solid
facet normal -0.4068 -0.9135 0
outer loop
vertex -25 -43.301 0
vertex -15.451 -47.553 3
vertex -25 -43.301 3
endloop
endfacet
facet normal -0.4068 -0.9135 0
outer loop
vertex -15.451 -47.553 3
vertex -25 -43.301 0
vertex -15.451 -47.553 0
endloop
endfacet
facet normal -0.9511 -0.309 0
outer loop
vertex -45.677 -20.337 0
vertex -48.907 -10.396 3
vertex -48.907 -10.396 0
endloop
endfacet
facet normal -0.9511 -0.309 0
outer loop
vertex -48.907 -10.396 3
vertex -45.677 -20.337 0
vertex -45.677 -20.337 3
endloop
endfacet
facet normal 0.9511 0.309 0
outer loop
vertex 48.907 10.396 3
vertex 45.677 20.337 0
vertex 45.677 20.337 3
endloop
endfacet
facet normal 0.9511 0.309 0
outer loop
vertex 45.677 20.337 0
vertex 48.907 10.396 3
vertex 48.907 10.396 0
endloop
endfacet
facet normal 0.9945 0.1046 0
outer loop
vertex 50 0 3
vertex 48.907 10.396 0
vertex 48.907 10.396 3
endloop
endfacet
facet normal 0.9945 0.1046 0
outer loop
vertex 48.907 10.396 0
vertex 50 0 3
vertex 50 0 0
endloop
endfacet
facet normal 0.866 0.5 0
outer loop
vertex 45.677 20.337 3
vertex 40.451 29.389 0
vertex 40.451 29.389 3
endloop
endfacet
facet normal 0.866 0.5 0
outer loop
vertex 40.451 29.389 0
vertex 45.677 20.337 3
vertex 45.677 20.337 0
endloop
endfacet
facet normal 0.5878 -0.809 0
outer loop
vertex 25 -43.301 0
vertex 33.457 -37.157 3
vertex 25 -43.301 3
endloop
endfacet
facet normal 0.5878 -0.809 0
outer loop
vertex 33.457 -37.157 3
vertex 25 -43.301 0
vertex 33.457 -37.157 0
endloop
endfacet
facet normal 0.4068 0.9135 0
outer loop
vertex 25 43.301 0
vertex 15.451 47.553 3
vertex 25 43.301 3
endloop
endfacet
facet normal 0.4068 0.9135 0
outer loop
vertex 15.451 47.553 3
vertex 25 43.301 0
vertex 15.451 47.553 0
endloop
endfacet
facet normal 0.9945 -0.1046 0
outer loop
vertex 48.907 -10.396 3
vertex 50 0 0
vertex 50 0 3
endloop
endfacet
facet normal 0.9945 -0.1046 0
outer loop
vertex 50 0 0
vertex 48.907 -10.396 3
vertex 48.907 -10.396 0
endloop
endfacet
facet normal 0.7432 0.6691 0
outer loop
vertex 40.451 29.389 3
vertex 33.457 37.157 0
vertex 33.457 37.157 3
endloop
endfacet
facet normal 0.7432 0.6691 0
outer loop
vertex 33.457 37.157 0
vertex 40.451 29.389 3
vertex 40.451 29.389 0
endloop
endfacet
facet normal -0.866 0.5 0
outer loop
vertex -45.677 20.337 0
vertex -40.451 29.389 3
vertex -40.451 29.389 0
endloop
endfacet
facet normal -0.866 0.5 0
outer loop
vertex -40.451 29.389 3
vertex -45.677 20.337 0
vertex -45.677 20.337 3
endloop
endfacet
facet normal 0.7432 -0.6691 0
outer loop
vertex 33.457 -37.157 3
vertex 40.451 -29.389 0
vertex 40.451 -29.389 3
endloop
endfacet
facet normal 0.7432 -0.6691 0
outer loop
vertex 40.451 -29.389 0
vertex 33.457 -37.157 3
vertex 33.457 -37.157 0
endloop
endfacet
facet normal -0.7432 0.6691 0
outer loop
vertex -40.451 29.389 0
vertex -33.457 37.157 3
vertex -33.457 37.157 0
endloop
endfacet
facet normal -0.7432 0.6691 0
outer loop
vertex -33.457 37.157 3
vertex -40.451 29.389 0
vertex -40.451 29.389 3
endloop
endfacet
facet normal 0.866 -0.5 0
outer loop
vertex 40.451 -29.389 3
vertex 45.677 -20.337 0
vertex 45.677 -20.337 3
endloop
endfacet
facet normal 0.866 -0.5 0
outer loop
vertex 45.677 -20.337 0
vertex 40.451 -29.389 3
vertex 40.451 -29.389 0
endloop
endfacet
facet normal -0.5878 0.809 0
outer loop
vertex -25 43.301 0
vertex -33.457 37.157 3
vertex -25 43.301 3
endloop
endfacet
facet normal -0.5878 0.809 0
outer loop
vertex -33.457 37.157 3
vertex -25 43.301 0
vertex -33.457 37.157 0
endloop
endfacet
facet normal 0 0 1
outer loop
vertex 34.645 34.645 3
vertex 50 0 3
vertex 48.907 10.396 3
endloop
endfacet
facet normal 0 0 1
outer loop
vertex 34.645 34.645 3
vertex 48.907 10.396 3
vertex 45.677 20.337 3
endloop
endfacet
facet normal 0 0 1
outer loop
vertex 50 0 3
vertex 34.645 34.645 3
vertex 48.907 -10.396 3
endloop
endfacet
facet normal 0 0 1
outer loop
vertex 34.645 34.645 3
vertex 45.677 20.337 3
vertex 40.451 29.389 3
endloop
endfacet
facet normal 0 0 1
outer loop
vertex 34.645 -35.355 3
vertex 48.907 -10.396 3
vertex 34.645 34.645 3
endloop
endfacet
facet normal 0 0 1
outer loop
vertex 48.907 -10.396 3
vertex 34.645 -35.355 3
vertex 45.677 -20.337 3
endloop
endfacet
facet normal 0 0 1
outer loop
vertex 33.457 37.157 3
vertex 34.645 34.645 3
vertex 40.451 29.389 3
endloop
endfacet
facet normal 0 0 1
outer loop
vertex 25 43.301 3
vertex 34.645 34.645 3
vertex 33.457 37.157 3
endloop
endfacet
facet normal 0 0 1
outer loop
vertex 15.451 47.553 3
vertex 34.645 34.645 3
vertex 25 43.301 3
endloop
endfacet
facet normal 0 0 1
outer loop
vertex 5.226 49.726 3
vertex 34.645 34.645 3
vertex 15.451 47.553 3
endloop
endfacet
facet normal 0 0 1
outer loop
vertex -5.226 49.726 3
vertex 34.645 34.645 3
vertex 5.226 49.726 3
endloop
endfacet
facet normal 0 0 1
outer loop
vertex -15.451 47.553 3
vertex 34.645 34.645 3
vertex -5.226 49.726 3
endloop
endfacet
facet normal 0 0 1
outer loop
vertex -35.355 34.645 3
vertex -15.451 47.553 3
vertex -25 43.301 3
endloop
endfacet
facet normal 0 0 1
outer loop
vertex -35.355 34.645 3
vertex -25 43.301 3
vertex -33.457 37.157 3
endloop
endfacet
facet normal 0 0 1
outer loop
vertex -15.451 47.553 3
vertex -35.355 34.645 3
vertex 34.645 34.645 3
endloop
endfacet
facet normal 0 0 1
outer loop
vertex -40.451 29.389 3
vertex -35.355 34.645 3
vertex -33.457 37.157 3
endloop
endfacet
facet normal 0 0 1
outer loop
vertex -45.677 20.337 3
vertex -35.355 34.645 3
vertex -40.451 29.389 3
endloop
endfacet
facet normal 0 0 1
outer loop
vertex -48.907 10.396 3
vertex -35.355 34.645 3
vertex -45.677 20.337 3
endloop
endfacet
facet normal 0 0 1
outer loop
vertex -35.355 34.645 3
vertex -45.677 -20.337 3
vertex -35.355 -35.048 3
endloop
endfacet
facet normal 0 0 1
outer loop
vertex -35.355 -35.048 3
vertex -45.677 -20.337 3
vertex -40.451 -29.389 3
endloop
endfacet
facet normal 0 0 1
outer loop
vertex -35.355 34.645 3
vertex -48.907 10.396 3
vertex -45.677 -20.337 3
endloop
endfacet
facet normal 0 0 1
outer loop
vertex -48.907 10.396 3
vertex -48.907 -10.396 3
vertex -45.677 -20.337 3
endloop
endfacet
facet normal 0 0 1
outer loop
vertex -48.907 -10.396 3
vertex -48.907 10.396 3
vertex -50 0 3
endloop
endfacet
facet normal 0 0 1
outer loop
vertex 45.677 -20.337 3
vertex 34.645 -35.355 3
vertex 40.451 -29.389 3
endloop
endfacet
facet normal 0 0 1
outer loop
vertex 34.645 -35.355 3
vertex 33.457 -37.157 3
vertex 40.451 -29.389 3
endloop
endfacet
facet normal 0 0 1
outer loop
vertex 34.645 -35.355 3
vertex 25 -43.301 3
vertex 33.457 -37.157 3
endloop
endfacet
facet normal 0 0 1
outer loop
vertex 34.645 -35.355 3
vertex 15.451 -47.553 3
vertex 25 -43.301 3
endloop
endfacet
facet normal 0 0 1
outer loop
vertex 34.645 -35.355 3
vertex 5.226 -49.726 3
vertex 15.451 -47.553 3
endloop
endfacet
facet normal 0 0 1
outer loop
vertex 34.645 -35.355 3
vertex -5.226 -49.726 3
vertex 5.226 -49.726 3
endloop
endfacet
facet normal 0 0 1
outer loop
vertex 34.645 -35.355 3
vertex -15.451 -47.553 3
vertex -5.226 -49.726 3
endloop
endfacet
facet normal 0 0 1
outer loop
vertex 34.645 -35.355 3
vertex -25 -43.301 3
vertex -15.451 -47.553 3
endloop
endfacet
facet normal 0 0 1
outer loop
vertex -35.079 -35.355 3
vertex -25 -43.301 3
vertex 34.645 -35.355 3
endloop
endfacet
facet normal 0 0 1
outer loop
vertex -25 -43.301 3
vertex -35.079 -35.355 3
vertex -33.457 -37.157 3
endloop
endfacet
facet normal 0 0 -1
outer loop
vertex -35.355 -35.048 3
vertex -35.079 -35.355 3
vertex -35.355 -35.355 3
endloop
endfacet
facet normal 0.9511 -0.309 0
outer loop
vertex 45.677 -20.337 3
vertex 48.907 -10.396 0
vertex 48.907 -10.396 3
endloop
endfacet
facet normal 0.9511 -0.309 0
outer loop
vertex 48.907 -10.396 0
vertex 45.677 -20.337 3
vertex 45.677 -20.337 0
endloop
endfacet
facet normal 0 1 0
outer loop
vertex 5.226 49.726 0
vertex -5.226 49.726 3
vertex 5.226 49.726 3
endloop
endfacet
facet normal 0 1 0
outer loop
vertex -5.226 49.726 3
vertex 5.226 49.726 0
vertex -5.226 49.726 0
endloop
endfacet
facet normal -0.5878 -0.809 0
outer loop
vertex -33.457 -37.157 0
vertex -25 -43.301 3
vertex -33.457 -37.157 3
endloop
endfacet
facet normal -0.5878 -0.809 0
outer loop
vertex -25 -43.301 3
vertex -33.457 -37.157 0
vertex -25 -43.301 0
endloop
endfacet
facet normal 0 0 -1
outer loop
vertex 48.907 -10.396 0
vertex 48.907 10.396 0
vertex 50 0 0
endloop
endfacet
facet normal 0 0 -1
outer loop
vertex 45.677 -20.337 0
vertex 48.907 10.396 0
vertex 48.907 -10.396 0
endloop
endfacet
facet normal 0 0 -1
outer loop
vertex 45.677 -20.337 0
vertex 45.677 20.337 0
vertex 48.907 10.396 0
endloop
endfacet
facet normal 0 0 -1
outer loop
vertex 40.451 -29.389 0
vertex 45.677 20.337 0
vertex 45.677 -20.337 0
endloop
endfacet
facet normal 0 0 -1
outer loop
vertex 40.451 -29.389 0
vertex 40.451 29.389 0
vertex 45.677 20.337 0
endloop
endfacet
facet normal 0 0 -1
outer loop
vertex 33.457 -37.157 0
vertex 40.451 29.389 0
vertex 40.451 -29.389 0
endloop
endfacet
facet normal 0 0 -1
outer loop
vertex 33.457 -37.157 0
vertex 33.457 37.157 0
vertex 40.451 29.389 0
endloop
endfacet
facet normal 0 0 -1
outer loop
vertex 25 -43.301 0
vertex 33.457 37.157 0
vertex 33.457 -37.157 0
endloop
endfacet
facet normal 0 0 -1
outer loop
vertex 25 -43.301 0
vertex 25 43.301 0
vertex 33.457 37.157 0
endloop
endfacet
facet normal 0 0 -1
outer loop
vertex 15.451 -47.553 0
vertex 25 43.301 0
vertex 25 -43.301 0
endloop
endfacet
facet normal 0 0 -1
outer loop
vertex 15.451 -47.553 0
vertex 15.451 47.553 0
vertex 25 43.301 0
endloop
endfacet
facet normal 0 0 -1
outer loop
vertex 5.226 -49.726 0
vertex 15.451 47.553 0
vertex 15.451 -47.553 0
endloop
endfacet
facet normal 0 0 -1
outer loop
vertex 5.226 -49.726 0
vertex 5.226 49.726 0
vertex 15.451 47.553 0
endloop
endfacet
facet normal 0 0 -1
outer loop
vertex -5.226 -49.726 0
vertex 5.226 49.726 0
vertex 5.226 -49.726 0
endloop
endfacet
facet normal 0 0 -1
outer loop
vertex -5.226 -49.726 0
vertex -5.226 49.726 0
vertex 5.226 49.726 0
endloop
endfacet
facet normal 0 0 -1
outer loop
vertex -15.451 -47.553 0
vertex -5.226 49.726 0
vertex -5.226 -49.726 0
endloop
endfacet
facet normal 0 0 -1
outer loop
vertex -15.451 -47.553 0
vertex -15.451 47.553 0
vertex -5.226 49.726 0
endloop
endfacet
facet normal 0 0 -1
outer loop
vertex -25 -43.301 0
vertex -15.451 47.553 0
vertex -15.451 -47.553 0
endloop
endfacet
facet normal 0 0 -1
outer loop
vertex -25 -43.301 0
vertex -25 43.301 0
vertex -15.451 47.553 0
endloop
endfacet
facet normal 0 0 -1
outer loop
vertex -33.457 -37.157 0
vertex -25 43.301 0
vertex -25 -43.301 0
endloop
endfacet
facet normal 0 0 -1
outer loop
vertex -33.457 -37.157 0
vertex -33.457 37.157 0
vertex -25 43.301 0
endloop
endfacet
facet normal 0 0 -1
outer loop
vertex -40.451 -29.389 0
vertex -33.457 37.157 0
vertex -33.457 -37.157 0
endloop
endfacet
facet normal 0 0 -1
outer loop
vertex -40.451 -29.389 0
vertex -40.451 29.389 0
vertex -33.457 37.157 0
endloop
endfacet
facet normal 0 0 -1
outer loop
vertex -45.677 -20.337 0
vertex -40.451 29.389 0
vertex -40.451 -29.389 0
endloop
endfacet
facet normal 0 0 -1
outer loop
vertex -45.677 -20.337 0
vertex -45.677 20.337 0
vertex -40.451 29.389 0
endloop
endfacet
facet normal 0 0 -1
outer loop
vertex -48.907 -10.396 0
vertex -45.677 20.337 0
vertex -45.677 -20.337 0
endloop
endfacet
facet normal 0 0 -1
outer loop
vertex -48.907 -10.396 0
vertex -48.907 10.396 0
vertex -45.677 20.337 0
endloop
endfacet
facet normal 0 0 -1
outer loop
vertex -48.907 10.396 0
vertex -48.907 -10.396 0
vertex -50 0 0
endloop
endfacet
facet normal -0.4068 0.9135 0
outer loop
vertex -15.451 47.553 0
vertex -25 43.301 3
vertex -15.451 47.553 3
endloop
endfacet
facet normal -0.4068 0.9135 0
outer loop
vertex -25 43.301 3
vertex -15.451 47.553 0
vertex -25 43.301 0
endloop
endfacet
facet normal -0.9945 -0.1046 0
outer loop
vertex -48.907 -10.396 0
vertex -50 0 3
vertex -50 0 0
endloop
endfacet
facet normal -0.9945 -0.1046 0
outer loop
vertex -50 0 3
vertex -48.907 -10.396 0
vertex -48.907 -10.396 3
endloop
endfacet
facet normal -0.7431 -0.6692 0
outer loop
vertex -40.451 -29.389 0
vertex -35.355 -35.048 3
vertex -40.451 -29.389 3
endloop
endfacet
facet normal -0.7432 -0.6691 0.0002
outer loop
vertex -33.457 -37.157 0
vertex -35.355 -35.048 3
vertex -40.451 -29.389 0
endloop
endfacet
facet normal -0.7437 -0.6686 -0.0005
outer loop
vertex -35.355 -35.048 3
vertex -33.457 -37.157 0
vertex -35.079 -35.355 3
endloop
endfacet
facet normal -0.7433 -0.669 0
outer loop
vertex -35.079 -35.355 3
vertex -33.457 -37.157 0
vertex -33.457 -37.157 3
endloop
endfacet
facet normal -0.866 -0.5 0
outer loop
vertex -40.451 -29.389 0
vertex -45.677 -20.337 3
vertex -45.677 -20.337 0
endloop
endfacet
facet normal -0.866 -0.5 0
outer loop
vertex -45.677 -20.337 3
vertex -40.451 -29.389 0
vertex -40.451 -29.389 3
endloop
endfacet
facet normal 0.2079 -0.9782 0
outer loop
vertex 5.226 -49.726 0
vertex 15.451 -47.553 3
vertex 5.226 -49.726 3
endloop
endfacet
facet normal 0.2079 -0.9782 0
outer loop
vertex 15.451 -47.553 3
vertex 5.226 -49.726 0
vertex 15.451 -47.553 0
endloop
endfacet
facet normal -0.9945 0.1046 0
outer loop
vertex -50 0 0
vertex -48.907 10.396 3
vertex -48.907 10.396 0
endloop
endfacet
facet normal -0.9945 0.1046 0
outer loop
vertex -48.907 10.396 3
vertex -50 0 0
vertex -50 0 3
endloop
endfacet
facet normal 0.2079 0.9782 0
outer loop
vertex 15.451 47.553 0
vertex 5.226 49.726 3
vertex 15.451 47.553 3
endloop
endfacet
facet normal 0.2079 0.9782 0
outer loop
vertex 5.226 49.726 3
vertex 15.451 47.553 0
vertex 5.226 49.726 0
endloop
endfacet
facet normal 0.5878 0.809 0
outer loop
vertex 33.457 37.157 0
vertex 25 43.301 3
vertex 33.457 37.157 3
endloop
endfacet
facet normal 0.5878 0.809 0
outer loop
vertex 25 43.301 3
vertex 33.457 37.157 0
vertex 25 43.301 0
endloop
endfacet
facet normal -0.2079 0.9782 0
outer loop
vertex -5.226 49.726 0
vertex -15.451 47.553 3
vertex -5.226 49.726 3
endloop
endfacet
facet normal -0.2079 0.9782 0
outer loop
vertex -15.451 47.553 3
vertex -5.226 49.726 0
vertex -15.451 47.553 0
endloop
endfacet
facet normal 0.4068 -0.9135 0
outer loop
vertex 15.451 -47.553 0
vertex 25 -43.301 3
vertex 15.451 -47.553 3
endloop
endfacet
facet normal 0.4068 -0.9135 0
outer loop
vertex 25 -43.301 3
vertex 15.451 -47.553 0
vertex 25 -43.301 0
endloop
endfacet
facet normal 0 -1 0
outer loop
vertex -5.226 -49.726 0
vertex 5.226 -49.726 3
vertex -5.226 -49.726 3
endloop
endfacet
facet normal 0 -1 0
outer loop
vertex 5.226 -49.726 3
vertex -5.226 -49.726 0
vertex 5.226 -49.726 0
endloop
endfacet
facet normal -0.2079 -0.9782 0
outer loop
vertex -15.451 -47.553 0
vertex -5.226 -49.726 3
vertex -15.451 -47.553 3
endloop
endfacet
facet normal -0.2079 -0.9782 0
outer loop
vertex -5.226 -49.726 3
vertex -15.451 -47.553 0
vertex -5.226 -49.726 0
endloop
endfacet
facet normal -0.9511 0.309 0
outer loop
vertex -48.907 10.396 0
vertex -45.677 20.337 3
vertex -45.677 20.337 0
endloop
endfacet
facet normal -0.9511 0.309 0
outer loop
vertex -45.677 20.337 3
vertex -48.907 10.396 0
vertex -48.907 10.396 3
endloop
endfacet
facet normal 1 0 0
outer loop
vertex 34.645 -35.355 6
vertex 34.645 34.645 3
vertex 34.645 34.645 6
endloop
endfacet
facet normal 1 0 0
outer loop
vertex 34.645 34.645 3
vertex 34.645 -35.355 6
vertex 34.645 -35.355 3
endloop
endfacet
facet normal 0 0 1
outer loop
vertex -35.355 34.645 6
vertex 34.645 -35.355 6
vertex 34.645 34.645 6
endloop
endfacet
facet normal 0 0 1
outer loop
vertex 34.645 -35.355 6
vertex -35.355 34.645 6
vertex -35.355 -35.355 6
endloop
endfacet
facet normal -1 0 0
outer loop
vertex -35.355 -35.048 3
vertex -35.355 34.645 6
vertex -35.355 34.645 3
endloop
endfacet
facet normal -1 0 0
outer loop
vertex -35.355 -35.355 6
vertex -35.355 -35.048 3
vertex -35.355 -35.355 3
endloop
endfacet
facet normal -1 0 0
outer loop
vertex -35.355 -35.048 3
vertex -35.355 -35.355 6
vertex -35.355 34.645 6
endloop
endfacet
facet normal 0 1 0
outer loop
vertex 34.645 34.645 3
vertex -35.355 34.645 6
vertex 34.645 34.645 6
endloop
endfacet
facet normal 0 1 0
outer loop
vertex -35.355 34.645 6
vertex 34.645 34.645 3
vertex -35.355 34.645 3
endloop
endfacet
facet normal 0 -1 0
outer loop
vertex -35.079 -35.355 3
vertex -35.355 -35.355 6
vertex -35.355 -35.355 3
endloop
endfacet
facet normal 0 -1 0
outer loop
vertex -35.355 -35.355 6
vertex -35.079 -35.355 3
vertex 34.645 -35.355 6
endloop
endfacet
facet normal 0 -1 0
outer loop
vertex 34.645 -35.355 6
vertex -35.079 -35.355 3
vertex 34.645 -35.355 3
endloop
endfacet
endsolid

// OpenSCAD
radius = 50;
size = 2 * radius * cos(45);
thickness = 3;

WhatsIt();

module WhatsIt() {
	translate([0, 0, 0]) cylinder(r = 50, h = thickness);
	translate([-size / 2, -size / 2, thickness]) cube([70, 70, thickness]);
}
